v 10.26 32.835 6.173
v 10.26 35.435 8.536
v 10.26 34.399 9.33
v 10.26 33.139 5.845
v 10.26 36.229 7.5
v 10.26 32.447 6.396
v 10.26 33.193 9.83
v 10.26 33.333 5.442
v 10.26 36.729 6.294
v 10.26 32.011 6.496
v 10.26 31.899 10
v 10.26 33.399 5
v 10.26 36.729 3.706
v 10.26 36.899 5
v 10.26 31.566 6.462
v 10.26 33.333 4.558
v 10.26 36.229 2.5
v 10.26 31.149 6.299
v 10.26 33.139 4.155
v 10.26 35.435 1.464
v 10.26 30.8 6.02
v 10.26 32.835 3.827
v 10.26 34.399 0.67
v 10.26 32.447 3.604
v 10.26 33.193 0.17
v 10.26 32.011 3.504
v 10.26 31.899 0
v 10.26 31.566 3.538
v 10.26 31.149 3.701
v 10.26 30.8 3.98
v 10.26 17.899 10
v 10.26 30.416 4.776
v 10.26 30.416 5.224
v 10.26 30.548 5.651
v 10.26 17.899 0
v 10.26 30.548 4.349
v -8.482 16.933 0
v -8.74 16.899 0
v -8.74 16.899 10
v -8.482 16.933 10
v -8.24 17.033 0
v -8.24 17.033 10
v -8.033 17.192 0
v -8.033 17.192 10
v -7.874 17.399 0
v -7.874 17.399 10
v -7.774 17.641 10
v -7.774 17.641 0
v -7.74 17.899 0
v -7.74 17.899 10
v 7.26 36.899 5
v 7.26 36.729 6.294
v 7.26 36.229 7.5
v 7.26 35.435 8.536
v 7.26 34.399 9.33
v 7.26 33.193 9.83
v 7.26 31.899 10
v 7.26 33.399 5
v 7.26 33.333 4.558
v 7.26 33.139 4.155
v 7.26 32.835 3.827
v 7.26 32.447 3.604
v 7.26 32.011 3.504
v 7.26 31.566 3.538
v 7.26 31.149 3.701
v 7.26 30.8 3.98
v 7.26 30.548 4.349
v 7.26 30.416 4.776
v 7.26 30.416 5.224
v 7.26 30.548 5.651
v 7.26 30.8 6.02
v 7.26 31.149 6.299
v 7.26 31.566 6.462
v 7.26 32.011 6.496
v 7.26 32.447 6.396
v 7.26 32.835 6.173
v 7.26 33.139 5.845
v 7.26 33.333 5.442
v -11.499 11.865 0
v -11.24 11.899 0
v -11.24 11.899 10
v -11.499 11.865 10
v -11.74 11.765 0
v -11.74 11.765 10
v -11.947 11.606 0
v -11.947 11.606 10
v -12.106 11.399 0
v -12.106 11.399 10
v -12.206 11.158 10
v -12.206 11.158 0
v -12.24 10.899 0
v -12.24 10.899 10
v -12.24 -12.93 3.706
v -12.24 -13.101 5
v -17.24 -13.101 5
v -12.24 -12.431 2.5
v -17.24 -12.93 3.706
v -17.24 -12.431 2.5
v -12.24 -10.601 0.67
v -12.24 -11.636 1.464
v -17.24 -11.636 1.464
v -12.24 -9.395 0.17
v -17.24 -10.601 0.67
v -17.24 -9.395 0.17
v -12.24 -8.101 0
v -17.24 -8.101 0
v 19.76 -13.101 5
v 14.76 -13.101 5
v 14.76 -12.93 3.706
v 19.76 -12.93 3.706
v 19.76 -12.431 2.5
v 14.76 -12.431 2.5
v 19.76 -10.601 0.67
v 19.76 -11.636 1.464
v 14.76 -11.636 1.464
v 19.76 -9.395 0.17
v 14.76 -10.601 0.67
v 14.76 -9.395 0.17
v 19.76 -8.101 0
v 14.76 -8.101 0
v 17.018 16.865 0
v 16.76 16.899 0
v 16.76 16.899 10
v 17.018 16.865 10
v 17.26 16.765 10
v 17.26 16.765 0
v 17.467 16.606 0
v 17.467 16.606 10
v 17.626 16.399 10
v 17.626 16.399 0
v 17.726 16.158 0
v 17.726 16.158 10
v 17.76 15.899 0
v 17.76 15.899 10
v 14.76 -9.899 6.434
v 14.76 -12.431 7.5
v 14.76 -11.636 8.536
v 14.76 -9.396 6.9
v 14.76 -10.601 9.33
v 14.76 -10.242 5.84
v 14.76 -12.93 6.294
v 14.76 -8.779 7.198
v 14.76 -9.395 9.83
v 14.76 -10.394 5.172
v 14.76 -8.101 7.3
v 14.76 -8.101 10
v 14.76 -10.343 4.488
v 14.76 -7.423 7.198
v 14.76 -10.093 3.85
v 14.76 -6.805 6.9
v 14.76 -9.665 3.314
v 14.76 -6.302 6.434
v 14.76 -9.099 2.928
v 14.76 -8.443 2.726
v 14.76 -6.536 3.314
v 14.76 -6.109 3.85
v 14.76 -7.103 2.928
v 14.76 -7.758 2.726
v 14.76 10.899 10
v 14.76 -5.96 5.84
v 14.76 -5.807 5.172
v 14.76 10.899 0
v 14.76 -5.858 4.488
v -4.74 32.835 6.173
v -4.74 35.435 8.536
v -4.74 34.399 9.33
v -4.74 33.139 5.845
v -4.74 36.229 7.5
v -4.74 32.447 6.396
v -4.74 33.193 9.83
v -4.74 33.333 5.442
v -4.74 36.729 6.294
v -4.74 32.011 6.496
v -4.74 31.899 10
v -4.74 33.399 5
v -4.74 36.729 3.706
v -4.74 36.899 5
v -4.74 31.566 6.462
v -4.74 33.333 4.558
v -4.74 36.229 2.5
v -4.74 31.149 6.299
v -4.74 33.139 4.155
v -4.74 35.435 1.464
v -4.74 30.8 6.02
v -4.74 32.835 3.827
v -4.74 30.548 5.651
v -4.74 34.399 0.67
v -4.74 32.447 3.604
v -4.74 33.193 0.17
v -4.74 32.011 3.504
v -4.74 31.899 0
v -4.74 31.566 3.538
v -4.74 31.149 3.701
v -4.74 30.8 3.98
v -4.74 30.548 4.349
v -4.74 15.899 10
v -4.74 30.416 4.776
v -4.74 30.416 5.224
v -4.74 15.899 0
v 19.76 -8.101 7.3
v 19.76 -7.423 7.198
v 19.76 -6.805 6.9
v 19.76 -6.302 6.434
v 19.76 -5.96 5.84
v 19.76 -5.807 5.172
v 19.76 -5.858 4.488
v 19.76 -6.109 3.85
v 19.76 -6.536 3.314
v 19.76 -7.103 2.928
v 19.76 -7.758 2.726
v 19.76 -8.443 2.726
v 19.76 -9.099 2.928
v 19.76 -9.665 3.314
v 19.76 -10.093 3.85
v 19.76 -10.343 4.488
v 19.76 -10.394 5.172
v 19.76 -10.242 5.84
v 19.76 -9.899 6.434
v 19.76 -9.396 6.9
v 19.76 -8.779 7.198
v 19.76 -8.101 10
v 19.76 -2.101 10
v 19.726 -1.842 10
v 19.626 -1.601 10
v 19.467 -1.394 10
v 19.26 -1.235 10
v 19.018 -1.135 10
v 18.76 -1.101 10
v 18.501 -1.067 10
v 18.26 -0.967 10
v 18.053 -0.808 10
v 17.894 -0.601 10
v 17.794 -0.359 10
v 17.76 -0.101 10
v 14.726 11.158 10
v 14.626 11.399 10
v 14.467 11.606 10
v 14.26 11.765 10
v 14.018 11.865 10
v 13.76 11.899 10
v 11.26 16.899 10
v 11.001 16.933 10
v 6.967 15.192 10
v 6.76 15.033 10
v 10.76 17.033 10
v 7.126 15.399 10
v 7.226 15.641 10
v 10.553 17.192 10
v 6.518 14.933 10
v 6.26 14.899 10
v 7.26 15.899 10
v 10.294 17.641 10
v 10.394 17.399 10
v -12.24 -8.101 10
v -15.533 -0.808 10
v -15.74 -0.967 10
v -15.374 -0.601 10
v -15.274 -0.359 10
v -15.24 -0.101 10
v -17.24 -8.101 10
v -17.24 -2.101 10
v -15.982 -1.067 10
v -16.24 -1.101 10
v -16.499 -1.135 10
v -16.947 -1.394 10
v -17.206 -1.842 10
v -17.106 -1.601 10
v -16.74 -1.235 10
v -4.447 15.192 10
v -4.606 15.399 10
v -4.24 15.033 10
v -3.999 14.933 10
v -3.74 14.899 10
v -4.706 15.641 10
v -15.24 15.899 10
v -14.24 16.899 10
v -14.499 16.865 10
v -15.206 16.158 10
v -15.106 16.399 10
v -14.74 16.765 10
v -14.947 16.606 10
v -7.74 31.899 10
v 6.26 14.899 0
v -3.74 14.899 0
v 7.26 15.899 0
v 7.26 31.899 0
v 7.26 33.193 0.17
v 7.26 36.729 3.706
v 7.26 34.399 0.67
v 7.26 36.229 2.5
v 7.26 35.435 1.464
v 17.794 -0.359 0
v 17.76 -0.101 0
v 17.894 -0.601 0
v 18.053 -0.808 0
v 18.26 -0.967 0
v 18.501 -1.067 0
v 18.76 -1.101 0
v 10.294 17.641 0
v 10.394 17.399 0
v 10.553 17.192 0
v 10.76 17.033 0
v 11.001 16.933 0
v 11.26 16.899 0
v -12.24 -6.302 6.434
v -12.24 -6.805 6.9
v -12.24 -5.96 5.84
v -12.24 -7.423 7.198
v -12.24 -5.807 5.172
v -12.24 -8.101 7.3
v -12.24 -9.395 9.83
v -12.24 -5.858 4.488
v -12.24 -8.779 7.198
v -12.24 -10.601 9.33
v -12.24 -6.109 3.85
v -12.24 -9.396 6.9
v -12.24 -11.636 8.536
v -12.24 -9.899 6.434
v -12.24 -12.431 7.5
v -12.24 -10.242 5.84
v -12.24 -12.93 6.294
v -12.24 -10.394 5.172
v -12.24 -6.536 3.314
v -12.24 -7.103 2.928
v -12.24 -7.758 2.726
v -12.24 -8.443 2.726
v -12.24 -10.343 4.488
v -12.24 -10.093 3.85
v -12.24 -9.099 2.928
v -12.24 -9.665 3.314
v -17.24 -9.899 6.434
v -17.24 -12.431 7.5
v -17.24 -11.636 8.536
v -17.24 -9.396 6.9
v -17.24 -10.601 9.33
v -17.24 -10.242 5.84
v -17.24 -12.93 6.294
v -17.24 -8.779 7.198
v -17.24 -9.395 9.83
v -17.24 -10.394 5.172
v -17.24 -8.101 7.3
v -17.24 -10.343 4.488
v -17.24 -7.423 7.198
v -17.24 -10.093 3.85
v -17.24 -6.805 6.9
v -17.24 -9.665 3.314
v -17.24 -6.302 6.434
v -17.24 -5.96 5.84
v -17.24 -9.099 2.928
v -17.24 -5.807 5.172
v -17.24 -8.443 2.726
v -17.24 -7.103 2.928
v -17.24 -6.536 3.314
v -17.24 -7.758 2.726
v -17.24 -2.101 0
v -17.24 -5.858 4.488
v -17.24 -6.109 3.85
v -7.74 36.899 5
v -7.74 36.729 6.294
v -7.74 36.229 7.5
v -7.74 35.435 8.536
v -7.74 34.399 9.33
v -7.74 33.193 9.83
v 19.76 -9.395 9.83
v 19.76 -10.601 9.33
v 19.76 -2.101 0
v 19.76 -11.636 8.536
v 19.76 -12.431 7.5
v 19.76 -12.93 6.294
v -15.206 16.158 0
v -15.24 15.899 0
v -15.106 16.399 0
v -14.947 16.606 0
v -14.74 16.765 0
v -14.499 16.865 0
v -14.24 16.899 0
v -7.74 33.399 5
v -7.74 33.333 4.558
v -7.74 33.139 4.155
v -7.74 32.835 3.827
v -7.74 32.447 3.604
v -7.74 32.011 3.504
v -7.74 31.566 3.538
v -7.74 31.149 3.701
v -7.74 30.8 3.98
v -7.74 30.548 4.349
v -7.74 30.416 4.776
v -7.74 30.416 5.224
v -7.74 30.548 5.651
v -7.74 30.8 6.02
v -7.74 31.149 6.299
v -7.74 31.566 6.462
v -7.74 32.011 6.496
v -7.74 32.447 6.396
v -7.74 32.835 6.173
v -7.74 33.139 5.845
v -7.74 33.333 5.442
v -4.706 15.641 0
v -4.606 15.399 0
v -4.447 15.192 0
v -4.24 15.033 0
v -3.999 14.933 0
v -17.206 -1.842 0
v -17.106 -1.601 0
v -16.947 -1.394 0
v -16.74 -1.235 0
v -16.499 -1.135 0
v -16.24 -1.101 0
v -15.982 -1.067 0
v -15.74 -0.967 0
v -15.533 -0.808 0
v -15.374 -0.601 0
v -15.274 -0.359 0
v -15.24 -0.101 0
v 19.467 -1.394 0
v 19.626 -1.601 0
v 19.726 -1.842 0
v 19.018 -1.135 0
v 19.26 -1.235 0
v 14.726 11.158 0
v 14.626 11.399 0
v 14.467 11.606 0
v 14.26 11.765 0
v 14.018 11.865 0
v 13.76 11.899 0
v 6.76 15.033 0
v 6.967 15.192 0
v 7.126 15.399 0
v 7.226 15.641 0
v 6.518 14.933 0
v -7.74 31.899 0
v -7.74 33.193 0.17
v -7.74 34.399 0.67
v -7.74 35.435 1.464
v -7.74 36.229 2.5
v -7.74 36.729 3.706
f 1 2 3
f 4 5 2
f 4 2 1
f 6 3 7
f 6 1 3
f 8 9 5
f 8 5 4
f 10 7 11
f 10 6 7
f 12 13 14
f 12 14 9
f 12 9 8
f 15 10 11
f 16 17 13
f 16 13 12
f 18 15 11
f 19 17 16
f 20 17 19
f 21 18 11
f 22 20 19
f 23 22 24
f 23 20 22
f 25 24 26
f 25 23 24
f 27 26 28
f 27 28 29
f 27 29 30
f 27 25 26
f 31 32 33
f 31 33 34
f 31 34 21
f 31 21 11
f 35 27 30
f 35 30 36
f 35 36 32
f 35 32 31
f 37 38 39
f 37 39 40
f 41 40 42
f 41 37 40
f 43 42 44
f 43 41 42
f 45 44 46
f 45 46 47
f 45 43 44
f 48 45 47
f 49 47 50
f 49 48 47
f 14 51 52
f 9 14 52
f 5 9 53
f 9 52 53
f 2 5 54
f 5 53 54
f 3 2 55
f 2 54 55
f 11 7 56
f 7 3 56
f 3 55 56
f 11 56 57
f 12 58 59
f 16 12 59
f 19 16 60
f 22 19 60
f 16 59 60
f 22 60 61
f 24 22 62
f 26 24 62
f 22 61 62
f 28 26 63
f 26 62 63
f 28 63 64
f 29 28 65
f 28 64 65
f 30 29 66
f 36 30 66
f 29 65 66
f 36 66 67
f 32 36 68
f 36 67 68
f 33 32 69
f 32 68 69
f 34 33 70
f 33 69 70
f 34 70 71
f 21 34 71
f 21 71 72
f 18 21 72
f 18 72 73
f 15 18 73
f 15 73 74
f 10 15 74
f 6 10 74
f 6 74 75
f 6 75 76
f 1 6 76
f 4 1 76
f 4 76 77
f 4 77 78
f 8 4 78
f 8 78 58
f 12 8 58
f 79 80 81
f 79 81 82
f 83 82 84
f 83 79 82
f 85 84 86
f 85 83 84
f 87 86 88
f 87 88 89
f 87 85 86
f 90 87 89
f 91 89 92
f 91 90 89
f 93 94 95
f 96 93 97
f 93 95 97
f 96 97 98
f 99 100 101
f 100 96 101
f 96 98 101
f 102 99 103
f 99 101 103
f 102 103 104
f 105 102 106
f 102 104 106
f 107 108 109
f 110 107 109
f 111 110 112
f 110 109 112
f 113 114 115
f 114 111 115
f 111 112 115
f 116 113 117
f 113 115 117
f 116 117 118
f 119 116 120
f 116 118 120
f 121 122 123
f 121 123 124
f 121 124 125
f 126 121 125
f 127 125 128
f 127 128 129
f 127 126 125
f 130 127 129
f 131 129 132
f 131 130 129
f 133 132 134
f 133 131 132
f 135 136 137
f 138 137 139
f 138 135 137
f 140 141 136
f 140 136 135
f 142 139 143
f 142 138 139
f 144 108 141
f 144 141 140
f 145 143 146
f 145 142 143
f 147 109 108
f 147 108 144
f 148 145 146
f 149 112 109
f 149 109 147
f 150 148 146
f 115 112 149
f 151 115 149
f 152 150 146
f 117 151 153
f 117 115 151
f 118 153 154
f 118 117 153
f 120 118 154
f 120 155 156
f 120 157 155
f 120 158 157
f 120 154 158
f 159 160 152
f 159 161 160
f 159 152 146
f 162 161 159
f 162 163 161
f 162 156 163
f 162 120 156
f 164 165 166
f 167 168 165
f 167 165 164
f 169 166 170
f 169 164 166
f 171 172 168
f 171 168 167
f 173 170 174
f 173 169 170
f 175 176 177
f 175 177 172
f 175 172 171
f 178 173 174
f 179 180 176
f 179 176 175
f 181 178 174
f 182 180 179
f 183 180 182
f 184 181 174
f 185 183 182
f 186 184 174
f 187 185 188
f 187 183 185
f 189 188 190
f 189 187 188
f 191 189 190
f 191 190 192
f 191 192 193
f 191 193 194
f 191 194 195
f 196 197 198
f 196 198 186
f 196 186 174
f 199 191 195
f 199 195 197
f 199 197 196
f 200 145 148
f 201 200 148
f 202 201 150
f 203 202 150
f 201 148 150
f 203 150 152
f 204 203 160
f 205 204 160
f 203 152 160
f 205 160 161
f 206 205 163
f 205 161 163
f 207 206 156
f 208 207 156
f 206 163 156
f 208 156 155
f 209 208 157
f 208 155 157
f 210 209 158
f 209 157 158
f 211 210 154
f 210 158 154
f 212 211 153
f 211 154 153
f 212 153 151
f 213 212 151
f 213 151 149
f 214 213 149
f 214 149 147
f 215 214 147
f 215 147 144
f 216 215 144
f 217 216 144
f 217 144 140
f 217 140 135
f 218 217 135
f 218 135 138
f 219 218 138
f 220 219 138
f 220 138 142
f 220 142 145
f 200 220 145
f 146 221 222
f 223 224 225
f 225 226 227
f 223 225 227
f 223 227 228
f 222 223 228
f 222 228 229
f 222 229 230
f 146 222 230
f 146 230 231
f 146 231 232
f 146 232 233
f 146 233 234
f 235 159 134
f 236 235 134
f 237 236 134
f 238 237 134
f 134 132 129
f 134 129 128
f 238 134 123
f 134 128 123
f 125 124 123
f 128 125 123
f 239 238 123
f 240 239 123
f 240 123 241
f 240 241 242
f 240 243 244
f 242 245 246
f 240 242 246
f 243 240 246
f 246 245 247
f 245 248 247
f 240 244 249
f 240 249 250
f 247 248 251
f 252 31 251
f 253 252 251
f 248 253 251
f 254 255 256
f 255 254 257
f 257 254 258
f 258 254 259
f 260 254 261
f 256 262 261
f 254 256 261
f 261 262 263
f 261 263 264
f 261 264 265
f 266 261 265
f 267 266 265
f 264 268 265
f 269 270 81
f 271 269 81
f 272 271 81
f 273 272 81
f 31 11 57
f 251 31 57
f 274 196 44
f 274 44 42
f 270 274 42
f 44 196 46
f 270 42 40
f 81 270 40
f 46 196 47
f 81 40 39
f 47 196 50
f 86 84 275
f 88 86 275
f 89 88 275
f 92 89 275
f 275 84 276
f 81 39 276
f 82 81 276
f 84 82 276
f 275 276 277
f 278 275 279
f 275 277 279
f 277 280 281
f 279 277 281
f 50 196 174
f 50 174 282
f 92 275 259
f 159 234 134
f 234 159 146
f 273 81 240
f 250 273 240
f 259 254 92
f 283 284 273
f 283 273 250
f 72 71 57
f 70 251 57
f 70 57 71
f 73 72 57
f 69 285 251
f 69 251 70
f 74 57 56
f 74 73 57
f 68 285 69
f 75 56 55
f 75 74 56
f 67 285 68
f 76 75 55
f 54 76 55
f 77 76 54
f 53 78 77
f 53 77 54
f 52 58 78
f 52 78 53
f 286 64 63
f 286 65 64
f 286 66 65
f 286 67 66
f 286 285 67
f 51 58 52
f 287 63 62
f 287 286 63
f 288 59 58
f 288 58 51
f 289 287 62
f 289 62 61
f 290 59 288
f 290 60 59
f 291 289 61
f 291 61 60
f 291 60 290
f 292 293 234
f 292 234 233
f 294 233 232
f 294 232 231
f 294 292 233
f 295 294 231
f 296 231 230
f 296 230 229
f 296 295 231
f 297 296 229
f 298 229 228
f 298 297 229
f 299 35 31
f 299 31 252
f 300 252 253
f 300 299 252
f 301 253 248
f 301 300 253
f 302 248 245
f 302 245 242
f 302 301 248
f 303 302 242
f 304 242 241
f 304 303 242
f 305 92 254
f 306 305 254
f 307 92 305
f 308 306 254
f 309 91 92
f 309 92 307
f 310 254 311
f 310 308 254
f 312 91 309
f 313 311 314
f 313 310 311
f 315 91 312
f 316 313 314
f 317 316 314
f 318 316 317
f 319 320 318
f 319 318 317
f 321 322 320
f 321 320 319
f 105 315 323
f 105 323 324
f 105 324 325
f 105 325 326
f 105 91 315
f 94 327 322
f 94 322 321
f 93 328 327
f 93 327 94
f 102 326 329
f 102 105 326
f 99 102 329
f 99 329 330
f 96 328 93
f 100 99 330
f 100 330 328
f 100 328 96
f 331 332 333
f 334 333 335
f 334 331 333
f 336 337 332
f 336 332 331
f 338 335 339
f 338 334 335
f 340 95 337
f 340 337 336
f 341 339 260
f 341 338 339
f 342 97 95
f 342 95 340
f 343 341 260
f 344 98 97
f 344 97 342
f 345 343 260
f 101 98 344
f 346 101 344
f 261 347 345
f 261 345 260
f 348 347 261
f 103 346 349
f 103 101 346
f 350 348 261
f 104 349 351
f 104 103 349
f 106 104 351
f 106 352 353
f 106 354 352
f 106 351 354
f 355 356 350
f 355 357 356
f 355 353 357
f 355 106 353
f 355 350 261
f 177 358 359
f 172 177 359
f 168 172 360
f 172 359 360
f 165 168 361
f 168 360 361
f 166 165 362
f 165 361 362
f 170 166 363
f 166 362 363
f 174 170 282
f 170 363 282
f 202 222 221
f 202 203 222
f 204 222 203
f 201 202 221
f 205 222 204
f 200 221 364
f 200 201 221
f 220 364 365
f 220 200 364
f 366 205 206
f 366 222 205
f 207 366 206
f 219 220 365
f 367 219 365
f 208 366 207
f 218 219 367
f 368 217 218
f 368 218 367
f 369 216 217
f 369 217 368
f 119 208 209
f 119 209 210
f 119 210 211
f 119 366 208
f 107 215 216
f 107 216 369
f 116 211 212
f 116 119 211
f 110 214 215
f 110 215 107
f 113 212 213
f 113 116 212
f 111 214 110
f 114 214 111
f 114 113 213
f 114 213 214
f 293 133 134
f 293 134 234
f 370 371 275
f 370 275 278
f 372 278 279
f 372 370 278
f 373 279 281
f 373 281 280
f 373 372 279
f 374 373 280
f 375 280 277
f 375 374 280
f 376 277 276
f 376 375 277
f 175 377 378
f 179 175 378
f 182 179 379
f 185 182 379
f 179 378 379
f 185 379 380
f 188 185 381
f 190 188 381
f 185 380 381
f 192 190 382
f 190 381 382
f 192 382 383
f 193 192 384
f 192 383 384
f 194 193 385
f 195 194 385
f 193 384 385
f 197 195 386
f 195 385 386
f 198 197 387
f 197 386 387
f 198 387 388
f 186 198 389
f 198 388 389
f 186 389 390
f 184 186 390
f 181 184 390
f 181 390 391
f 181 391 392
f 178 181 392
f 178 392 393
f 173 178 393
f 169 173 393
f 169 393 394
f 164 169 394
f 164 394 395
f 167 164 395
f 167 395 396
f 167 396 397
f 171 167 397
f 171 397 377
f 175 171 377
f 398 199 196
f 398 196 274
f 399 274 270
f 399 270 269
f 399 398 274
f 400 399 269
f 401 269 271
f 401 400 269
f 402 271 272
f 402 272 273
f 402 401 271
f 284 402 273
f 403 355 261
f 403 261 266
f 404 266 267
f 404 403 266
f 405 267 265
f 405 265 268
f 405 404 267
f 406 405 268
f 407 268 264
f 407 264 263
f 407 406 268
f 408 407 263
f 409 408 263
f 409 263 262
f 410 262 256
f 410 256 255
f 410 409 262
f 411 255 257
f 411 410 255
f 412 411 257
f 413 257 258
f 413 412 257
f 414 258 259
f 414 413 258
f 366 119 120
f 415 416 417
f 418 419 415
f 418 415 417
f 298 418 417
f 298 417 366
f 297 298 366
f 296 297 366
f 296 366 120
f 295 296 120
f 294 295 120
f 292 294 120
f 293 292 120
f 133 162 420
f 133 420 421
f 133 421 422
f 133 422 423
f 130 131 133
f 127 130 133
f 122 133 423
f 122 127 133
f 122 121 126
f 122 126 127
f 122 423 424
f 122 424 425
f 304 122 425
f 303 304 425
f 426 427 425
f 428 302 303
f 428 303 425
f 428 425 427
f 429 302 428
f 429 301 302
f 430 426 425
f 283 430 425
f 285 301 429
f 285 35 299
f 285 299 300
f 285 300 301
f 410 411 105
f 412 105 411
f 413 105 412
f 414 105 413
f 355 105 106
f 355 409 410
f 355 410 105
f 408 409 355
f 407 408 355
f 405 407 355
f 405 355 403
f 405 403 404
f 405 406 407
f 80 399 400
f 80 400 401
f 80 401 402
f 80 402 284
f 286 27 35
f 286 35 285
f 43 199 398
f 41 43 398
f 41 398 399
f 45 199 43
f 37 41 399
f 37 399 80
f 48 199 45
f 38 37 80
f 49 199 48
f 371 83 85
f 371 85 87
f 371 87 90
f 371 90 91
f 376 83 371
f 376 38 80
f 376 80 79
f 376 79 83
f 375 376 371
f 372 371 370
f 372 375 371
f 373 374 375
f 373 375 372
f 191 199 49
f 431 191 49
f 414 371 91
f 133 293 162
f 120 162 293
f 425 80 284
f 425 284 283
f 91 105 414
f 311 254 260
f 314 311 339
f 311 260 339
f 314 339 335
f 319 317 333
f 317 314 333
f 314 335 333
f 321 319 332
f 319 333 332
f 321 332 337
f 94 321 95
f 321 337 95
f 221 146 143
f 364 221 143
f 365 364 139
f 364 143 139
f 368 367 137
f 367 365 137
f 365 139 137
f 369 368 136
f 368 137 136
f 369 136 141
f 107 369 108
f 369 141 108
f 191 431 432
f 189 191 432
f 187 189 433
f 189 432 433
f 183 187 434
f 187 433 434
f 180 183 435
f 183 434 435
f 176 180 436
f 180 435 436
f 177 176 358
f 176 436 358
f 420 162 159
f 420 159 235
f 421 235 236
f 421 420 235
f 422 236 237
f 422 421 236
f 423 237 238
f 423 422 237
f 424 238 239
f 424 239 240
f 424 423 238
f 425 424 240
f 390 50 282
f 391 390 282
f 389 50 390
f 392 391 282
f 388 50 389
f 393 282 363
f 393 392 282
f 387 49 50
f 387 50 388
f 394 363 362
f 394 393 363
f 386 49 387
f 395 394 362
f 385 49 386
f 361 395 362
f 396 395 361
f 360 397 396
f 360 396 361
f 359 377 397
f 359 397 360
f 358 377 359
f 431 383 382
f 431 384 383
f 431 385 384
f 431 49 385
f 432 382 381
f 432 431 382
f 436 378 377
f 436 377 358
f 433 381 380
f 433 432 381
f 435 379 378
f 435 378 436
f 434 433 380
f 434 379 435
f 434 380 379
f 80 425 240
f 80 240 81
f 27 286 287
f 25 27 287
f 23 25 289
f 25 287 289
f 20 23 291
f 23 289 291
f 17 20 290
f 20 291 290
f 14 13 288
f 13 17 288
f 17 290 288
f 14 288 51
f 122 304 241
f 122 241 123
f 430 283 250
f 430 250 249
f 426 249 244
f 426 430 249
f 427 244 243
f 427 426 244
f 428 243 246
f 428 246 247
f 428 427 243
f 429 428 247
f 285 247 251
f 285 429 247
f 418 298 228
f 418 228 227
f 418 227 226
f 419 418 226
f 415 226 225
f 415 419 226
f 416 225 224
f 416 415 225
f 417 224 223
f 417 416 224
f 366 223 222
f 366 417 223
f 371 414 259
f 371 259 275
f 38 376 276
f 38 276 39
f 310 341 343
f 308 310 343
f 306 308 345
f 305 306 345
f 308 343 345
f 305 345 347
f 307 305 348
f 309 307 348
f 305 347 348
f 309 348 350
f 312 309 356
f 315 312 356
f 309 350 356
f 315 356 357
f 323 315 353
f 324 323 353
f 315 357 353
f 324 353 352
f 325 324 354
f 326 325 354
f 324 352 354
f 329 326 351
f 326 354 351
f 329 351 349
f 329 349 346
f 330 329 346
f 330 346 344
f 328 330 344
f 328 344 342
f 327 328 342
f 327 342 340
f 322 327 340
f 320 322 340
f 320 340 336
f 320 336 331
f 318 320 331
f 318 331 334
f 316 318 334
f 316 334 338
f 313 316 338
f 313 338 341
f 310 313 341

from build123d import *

# Parameters (mm, degrees)
BOSS_EXTRU_1_DEPTH      = 10
ESQUISSE2_R             = 1.5
ESQUISSE2_R_2           = 2.3
ENL_V_MAT_EXTRU_1_DEPTH = 54.203009486


with BuildPart() as part:
    # Esquisse1 → Boss.-Extru.1 (new body)
    with BuildSketch(Plane.XY):
        with BuildLine():
            Line((-17.240327137, -13.100674555), (-17.240327137, -2.100674555))
            ThreePointArc((-17.240327137, -2.100674555), (-16.947433918, -1.393567773), (-16.240327137, -1.100674555))
            ThreePointArc((-16.240327137, -1.100674555), (-15.533220355, -0.807781336), (-15.240327137, -0.100674555))
            Line((-15.240327137, -0.100674555), (-15.240327137, 15.899325445))
            ThreePointArc((-15.240327137, 15.899325445), (-14.947433918, 16.606432227), (-14.240327137, 16.899325445))
            Line((-14.240327137, 16.899325445), (-8.740327137, 16.899325445))
            ThreePointArc((-8.740327137, 16.899325445), (-8.033220355, 17.192218664), (-7.740327137, 17.899325445))
            Line((-7.740327137, 17.899325445), (-7.740327137, 36.899325445))
            Line((-7.740327137, 36.899325445), (-4.740327137, 36.899325445))
            Line((-4.740327137, 36.899325445), (-4.740327137, 15.899325445))
            ThreePointArc((-4.740327137, 15.899325445), (-4.447433918, 15.192218664), (-3.740327137, 14.899325445))
            Line((-3.740327137, 14.899325445), (6.259672863, 14.899325445))
            ThreePointArc((6.259672863, 14.899325445), (6.966779645, 15.192218664), (7.259672863, 15.899325445))
            Line((7.259672863, 15.899325445), (7.259672863, 36.899325445))
            Line((7.259672863, 36.899325445), (10.259672863, 36.899325445))
            Line((10.259672863, 36.899325445), (10.259672863, 17.899325445))
            ThreePointArc((10.259672863, 17.899325445), (10.552566082, 17.192218664), (11.259672863, 16.899325445))
            Line((11.259672863, 16.899325445), (16.759672863, 16.899325445))
            ThreePointArc((16.759672863, 16.899325445), (17.466779645, 16.606432227), (17.759672863, 15.899325445))
            Line((17.759672863, 15.899325445), (17.759672863, -0.100674555))
            ThreePointArc((17.759672863, -0.100674555), (18.052566082, -0.807781336), (18.759672863, -1.100674555))
            ThreePointArc((18.759672863, -1.100674555), (19.466779645, -1.393567773), (19.759672863, -2.100674555))
            Line((19.759672863, -2.100674555), (19.759672863, -13.100674555))
            Line((19.759672863, -13.100674555), (14.759672863, -13.100674555))
            Line((14.759672863, -13.100674555), (14.759672863, 10.899325445))
            ThreePointArc((14.759672863, 10.899325445), (14.466779645, 11.606432227), (13.759672863, 11.899325445))
            Line((13.759672863, 11.899325445), (-11.240327137, 11.899325445))
            ThreePointArc((-11.240327137, 11.899325445), (-11.947433918, 11.606432227), (-12.240327137, 10.899325445))
            Line((-12.240327137, 10.899325445), (-12.240327137, -13.100674555))
            Line((-12.240327137, -13.100674555), (-17.240327137, -13.100674555))
        make_face()
    extrude(amount=BOSS_EXTRU_1_DEPTH)

    # Esquisse2 → Enlèv. mat.-Extru.1 (cut, through all)
    with BuildSketch(Plane.ZY.offset(17.240327137)):
        with BuildLine():
            Line((0, 36.899325445), (0, 31.899325445))
            ThreePointArc((0, 31.899325445), (1.464466094, 35.434859351), (5, 36.899325445))
            Line((5, 36.899325445), (0, 36.899325445))
        make_face()
        with BuildLine():
            Line((10, 36.899325445), (5, 36.899325445))
            ThreePointArc((5, 36.899325445), (8.535533906, 35.434859351), (10, 31.899325445))
            Line((10, 31.899325445), (10, 36.899325445))
        make_face()
        with BuildLine():
            ThreePointArc((10, -8.100674555), (8.535533906, -11.636208461), (5, -13.100674555))
            Line((5, -13.100674555), (10, -13.100674555))
            Line((10, -13.100674555), (10, -8.100674555))
        make_face()
        with BuildLine():
            ThreePointArc((5, -13.100674555), (1.464466094, -11.636208461), (0, -8.100674555))
            Line((0, -8.100674555), (0, -13.100674555))
            Line((0, -13.100674555), (5, -13.100674555))
        make_face()
        with Locations(Location((5, 31.899325445, 0), (0, 0, 90))):
            Circle(ESQUISSE2_R)
        with Locations((5, -8.100674555)):
            Circle(ESQUISSE2_R_2)
    extrude(amount=-ENL_V_MAT_EXTRU_1_DEPTH, mode=Mode.SUBTRACT)


solid = part.part
